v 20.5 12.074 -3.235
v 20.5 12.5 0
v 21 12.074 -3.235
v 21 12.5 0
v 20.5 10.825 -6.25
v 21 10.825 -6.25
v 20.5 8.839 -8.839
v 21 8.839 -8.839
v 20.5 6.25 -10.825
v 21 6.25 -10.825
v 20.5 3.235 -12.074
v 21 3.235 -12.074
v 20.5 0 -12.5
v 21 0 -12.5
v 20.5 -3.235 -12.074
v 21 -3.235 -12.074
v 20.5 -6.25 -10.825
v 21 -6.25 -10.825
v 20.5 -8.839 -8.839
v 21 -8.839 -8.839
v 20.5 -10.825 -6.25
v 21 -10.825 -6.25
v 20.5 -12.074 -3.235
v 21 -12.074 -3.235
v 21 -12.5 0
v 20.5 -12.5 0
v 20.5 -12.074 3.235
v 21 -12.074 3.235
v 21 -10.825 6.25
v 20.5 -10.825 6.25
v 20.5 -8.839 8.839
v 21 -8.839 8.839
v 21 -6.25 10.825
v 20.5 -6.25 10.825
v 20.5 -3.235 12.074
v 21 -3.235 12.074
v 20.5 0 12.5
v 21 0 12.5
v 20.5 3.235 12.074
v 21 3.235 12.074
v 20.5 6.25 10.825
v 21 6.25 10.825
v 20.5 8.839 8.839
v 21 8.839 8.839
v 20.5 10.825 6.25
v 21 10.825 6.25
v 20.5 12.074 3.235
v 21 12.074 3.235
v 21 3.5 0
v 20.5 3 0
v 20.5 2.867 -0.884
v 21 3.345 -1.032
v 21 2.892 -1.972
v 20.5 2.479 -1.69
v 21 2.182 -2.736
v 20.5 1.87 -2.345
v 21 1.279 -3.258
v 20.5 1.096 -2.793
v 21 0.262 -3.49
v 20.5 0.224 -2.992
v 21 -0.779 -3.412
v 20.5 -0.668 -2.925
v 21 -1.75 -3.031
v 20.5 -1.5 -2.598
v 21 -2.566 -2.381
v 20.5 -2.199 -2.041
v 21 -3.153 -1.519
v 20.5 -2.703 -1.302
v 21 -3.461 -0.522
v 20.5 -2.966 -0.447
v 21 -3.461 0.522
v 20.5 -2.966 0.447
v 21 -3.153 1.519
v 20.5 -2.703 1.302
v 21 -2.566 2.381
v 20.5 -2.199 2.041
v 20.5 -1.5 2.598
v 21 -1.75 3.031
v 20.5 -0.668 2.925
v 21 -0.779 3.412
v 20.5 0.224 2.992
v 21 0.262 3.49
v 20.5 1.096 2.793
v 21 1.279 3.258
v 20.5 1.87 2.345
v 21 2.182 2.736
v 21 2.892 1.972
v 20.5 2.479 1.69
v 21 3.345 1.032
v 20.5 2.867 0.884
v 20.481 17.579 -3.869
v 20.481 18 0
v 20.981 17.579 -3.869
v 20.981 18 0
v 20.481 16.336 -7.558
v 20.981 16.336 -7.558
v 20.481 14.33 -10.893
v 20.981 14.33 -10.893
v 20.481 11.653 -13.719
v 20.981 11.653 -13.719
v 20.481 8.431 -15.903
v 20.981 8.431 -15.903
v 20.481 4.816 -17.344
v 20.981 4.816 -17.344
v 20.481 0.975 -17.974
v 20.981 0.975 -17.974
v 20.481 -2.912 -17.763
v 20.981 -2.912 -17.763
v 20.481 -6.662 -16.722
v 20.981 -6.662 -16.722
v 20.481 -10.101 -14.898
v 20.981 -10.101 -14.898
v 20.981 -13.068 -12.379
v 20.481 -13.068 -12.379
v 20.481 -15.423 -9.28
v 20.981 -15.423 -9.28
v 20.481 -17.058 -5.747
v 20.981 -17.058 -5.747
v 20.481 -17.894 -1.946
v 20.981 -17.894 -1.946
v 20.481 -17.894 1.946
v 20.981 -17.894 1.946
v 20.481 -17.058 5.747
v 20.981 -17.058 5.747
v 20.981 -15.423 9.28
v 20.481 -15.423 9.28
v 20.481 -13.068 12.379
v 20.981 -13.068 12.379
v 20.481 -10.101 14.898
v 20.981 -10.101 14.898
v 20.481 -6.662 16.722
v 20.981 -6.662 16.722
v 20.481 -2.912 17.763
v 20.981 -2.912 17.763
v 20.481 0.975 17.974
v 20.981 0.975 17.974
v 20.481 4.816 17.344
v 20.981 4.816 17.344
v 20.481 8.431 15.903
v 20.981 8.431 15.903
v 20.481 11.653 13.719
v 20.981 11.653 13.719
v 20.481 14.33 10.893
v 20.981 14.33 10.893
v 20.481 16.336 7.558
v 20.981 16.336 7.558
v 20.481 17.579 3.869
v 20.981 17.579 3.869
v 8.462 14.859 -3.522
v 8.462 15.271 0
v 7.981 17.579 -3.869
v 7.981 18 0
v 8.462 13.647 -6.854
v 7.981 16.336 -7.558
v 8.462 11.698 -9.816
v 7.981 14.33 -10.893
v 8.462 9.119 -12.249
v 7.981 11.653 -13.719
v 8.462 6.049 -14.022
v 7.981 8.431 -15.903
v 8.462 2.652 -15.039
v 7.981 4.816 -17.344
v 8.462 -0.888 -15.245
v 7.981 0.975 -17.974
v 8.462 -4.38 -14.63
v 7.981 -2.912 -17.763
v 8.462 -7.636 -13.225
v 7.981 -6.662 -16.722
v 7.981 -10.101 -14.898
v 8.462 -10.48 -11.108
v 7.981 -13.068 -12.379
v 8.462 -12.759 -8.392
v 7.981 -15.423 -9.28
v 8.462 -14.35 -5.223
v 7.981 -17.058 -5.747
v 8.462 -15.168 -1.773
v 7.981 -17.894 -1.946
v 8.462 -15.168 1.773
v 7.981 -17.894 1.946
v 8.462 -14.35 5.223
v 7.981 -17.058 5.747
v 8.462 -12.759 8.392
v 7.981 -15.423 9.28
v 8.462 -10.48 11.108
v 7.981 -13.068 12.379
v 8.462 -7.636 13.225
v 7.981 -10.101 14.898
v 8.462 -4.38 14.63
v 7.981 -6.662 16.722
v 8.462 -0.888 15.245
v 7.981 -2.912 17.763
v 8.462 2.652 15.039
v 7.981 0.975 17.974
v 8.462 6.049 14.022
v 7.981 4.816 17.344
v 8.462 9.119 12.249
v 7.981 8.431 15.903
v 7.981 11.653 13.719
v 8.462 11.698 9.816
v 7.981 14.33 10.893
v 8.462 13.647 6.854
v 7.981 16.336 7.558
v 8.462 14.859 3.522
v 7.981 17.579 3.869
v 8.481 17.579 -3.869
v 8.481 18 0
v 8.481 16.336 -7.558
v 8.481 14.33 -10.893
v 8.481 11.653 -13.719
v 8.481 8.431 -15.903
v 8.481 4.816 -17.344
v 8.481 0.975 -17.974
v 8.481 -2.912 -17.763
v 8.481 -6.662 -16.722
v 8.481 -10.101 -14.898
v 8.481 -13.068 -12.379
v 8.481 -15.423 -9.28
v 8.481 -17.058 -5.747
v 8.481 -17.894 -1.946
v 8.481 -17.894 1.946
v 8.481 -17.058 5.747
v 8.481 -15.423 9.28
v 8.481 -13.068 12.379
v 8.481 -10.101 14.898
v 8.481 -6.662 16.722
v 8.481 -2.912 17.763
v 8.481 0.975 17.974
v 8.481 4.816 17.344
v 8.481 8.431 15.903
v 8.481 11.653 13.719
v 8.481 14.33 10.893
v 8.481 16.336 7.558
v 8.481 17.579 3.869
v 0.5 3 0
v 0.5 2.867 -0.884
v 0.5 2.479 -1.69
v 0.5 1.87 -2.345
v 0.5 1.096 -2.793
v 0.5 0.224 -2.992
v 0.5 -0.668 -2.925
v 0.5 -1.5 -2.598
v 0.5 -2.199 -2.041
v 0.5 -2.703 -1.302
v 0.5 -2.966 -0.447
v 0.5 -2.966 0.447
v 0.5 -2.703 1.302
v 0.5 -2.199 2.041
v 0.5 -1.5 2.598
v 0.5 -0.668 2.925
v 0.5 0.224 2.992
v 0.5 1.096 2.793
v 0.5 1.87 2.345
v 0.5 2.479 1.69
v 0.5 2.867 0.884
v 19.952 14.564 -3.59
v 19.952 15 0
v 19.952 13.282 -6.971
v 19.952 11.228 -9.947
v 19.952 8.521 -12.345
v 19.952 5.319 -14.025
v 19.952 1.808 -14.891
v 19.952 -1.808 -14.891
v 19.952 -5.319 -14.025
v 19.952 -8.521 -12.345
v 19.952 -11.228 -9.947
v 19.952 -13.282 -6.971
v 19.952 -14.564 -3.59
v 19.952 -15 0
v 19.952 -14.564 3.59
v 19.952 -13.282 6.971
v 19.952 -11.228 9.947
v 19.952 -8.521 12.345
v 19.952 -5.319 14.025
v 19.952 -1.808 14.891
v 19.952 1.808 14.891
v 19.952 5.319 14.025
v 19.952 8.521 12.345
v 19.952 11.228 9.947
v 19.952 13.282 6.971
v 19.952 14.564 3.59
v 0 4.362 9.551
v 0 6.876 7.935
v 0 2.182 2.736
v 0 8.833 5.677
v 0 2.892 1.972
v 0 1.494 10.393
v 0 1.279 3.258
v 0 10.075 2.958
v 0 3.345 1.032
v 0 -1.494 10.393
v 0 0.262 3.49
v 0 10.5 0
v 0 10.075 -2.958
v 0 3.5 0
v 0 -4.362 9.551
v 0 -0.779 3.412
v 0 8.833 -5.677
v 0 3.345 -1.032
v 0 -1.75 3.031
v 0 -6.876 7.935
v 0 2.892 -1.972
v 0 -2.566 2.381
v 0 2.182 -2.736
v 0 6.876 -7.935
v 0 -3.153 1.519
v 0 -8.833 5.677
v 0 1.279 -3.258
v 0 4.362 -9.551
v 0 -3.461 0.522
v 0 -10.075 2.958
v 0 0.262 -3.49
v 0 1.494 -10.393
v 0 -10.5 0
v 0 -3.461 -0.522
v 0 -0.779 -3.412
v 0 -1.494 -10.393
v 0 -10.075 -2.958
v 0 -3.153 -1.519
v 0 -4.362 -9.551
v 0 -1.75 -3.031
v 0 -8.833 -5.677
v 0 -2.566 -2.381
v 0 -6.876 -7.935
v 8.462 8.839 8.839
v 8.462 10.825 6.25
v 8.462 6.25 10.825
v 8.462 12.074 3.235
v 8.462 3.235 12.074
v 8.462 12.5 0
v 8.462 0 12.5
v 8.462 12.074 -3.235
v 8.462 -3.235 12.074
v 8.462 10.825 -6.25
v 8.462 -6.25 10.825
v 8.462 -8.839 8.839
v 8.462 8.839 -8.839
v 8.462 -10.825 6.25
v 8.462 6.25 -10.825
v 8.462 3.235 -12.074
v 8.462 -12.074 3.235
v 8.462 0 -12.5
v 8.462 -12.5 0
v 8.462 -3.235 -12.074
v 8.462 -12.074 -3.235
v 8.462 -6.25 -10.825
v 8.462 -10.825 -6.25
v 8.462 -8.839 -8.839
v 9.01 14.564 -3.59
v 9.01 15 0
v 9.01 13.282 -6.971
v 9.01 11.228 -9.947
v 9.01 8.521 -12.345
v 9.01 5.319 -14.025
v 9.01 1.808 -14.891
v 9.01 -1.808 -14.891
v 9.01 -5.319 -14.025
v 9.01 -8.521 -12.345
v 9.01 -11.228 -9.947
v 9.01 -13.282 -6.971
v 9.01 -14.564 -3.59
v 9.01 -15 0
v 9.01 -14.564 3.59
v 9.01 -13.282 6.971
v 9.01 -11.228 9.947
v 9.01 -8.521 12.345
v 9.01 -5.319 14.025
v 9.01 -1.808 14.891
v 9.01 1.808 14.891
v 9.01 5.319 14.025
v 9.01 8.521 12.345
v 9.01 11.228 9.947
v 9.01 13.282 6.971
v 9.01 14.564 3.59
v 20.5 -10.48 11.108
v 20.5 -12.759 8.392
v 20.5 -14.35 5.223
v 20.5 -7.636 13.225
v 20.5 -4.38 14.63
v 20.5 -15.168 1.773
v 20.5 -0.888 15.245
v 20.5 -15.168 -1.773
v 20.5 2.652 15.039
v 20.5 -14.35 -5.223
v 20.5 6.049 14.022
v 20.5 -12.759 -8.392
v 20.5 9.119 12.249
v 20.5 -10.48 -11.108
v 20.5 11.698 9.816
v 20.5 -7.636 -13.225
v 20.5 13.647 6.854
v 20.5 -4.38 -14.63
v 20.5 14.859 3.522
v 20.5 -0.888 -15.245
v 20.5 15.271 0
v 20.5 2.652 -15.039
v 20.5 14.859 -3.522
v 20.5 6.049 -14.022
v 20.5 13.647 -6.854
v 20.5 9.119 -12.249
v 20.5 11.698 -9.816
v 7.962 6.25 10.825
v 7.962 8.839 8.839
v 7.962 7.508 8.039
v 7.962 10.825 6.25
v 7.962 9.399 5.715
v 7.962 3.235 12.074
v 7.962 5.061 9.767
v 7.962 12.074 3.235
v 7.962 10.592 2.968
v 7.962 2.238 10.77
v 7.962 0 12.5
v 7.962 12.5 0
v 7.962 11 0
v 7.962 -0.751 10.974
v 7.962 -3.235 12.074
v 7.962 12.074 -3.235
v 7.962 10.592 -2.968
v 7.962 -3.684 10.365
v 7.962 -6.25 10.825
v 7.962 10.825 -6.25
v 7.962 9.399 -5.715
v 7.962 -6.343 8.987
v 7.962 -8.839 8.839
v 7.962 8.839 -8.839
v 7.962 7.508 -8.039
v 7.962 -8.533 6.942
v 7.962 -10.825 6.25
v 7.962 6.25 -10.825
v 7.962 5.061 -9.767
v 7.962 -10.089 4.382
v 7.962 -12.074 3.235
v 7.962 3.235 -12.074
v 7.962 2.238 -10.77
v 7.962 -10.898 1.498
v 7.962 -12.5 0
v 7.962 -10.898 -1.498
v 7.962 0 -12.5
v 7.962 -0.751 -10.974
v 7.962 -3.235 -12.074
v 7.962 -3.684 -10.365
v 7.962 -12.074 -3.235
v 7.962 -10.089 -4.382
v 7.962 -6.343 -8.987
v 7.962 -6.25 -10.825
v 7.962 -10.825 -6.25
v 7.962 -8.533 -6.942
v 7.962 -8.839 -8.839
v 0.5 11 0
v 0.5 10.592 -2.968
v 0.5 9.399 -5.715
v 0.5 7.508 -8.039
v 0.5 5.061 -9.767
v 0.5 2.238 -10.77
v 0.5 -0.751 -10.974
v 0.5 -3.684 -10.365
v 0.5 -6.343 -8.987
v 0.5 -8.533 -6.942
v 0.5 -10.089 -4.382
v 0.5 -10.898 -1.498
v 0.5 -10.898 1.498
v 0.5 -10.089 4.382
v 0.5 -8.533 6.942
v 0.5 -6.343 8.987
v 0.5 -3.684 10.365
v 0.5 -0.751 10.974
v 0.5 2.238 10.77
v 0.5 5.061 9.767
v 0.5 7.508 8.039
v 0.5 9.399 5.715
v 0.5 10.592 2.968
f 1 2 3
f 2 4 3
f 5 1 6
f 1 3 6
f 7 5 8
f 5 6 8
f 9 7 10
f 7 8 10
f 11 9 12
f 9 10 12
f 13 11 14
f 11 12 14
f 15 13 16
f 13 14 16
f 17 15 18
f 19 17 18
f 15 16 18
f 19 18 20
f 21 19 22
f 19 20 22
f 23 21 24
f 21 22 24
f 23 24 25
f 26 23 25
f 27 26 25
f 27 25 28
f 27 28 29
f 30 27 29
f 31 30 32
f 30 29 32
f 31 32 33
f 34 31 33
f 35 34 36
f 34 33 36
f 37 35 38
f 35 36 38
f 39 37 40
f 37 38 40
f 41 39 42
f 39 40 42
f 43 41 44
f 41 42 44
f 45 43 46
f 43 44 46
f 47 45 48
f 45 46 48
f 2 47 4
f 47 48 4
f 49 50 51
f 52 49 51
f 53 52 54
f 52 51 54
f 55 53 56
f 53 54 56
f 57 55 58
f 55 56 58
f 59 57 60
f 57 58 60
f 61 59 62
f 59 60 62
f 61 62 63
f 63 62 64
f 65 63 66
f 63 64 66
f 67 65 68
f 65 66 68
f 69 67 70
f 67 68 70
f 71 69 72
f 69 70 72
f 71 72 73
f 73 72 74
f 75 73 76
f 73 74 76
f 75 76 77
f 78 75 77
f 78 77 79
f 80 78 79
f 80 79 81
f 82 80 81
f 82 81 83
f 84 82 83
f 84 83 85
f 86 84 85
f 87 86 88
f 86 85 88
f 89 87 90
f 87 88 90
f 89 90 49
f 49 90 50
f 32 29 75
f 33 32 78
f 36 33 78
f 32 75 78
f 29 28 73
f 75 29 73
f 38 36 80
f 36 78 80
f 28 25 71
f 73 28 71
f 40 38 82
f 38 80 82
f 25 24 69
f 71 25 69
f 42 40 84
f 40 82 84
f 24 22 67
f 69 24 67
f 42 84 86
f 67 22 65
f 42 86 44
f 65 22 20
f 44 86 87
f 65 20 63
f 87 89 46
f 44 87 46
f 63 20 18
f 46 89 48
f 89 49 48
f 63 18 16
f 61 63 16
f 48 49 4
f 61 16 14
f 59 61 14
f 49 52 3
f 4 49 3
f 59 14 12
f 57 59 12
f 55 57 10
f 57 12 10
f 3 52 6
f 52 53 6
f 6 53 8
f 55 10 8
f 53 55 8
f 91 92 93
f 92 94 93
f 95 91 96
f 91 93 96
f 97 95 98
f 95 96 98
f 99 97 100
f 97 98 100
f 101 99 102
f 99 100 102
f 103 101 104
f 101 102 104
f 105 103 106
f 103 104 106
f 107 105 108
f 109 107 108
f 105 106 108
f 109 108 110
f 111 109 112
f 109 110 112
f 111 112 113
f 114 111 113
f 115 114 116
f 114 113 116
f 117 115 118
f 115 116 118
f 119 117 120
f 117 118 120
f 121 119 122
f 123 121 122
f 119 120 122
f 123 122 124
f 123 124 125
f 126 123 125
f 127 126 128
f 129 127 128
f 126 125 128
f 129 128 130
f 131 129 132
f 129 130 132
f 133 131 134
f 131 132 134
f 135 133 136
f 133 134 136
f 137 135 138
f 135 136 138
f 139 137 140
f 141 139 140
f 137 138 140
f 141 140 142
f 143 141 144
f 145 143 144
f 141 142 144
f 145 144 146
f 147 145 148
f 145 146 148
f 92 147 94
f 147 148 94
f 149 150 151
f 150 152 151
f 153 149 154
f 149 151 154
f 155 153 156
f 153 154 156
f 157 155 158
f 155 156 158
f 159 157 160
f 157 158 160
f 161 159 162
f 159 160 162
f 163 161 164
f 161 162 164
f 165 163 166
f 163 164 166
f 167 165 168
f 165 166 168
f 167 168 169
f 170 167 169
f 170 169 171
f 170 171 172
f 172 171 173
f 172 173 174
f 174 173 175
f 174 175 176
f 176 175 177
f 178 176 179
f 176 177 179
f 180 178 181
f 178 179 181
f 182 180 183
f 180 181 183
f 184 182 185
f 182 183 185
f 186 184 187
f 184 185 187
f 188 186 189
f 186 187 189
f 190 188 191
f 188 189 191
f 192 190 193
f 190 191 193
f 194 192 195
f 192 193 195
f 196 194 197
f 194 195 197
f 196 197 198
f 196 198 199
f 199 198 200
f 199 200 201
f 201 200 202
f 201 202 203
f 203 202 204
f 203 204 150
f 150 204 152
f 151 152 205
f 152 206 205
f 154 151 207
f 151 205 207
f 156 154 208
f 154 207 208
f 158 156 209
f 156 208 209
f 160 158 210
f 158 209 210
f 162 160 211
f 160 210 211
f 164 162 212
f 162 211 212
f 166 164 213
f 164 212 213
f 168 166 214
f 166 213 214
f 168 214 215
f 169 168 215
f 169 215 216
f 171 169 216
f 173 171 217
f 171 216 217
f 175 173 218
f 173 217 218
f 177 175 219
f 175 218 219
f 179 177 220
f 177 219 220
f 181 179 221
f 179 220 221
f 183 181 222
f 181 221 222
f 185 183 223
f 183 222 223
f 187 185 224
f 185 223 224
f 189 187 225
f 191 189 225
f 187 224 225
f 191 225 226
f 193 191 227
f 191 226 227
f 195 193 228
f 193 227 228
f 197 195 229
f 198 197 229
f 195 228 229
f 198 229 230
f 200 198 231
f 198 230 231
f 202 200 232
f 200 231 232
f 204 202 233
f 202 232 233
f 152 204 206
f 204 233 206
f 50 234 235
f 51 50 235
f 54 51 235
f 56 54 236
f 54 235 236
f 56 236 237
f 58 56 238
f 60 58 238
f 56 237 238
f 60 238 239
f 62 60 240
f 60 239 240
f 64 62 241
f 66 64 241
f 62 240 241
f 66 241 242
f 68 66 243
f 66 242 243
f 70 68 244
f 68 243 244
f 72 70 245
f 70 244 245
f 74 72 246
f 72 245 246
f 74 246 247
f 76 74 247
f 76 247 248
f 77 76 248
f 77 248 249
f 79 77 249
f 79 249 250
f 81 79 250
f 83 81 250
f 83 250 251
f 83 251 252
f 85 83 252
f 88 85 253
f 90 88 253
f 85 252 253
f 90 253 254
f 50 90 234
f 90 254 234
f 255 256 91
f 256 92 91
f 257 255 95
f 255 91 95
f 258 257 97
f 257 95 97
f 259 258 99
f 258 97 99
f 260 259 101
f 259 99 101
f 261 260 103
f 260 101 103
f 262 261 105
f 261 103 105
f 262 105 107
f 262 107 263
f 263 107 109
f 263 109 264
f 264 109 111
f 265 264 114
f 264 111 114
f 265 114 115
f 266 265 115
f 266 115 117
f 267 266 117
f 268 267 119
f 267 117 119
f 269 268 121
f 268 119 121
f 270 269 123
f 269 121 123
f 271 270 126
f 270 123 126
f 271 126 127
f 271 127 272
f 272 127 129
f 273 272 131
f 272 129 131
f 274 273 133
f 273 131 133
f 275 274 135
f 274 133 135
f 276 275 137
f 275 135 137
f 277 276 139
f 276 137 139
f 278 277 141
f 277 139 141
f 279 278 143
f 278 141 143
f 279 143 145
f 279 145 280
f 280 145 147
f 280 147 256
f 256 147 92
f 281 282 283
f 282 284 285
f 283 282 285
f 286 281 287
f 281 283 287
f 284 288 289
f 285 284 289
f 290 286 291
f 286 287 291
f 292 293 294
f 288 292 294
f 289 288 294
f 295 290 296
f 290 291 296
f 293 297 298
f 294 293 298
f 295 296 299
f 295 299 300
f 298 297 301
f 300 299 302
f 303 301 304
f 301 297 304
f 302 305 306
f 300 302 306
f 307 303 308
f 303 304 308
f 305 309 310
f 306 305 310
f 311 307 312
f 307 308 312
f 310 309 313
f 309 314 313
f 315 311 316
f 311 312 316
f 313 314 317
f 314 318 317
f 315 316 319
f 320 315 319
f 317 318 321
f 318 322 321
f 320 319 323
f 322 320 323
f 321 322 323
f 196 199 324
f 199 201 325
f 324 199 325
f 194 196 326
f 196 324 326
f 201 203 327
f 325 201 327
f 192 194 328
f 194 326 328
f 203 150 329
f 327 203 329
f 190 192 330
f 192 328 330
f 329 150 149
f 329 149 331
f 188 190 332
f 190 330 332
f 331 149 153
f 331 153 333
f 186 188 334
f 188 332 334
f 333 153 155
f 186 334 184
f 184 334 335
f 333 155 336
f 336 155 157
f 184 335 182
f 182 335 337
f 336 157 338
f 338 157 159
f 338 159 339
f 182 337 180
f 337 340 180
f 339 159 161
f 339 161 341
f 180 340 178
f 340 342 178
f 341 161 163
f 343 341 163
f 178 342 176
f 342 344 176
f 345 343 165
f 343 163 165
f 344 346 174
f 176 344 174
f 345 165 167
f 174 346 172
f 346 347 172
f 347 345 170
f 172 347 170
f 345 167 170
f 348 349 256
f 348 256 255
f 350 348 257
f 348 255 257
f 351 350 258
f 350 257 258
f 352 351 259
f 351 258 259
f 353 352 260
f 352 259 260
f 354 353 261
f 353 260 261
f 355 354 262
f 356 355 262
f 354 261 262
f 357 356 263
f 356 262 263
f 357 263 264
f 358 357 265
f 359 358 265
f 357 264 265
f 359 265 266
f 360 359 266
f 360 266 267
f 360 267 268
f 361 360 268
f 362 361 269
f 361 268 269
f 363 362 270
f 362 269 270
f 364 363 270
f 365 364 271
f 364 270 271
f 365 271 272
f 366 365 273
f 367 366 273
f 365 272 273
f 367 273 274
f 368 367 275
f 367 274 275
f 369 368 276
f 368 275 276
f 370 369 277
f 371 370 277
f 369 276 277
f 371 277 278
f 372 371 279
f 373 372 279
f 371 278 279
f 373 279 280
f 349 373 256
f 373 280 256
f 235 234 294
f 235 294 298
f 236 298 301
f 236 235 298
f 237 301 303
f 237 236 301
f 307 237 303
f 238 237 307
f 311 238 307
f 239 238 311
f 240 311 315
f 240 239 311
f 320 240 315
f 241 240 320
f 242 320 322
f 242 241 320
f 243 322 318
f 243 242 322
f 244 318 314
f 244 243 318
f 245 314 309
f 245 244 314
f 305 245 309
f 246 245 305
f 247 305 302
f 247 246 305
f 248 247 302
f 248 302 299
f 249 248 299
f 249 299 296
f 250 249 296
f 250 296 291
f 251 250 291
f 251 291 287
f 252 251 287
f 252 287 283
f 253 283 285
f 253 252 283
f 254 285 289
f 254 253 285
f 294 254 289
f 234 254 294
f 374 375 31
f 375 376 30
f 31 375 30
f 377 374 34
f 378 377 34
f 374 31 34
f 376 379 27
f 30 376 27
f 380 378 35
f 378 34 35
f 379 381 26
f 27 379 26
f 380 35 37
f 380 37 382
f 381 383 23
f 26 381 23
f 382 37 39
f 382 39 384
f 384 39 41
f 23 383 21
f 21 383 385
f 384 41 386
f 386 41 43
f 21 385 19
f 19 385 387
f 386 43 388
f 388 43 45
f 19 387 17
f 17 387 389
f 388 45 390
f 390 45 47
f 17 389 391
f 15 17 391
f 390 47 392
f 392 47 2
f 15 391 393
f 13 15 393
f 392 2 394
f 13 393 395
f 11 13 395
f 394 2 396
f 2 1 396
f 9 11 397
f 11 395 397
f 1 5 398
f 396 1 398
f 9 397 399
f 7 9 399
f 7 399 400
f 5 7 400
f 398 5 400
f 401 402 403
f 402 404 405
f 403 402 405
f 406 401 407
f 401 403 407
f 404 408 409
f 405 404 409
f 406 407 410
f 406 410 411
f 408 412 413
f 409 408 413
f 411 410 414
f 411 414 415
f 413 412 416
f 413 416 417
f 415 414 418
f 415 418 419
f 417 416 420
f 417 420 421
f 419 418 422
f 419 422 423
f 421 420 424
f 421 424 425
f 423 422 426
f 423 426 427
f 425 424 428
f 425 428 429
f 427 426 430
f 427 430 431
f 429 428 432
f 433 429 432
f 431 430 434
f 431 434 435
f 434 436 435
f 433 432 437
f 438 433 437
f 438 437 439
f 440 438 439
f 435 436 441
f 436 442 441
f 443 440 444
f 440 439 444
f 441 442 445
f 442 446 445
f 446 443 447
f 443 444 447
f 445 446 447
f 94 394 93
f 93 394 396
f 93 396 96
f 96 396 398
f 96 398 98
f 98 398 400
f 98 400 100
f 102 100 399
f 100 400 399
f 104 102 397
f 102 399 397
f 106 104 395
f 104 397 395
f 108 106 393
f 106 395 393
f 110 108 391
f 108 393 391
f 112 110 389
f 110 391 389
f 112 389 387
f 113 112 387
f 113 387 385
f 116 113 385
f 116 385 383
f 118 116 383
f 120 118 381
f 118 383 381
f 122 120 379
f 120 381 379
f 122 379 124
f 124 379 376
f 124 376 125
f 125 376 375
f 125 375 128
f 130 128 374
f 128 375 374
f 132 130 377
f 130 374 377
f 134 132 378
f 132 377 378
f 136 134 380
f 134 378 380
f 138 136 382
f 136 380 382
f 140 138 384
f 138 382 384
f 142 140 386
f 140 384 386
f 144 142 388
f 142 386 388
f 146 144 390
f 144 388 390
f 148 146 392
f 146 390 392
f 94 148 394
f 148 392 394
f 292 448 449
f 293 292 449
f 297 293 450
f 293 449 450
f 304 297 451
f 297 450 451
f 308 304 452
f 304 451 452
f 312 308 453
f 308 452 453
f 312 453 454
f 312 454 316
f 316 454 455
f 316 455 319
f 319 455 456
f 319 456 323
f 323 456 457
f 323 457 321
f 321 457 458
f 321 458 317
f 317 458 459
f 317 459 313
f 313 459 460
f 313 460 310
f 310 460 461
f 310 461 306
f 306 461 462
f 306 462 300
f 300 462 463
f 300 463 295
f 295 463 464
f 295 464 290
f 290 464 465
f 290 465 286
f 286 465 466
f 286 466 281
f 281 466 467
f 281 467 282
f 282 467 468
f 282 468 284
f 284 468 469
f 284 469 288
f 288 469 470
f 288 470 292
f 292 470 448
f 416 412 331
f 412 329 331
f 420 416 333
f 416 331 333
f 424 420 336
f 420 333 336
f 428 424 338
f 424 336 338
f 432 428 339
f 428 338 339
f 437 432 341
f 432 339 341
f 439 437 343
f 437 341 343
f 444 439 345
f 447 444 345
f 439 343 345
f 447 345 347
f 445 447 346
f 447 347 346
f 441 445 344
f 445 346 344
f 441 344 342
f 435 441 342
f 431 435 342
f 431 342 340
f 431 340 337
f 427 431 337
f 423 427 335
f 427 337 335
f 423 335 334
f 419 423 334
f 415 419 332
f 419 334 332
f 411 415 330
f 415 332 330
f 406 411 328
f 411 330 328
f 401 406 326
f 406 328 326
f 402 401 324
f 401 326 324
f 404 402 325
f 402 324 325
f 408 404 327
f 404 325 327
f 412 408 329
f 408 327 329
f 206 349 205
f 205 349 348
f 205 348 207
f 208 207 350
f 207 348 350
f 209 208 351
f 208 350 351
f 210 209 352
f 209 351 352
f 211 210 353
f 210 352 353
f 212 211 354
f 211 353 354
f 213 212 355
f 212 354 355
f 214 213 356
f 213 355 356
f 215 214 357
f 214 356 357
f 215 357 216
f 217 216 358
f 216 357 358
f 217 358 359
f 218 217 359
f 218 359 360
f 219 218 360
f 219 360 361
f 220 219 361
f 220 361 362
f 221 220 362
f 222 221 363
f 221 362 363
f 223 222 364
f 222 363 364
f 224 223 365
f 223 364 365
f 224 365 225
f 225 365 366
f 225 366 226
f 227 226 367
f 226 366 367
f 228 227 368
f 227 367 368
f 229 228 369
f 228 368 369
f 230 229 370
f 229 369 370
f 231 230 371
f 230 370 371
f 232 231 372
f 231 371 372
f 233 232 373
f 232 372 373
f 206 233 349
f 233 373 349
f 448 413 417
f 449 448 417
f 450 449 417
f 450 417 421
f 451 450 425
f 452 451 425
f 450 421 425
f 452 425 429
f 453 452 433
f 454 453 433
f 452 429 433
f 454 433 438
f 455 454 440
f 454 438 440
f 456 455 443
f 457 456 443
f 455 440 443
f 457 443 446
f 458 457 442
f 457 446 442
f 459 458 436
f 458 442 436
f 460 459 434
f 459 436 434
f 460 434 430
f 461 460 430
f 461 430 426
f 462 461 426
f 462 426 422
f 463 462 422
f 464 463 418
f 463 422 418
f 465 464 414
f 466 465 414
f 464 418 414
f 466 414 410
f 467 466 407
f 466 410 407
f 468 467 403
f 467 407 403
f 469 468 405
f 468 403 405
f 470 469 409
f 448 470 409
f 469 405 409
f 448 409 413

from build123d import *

# Parameters (mm, degrees)
FASE1_SIZE = 0.5


with BuildPart() as part:
    # Layout → Rotation1 (revolve)
    with BuildSketch(Plane.XY):
        Polygon((0, 3), (0, 11), (7.962375299, 11), (7.962375299, 12.5), (8.462375299, 12.5), (8.462375299, 15.271049232), (7.981187649, 18), (8.481187649, 18), (9.010168592, 15), (19.952206707, 15), (20.481187649, 18), (20.981187649, 18), (20.5, 15.271049232), (20.5, 12.5), (21, 12.5), (21, 3), align=None)
    revolve(axis=Axis((21, 0, 0), (-1, 0, 0)))

    # Fase1
    fase1_edges = [part.edges().sort_by_distance(p)[0] for p in [
        (0, -11, 0),
        (0, -3, 0),
        (21, -3, 0),
    ]]
    chamfer(fase1_edges, length=FASE1_SIZE)


solid = part.part
